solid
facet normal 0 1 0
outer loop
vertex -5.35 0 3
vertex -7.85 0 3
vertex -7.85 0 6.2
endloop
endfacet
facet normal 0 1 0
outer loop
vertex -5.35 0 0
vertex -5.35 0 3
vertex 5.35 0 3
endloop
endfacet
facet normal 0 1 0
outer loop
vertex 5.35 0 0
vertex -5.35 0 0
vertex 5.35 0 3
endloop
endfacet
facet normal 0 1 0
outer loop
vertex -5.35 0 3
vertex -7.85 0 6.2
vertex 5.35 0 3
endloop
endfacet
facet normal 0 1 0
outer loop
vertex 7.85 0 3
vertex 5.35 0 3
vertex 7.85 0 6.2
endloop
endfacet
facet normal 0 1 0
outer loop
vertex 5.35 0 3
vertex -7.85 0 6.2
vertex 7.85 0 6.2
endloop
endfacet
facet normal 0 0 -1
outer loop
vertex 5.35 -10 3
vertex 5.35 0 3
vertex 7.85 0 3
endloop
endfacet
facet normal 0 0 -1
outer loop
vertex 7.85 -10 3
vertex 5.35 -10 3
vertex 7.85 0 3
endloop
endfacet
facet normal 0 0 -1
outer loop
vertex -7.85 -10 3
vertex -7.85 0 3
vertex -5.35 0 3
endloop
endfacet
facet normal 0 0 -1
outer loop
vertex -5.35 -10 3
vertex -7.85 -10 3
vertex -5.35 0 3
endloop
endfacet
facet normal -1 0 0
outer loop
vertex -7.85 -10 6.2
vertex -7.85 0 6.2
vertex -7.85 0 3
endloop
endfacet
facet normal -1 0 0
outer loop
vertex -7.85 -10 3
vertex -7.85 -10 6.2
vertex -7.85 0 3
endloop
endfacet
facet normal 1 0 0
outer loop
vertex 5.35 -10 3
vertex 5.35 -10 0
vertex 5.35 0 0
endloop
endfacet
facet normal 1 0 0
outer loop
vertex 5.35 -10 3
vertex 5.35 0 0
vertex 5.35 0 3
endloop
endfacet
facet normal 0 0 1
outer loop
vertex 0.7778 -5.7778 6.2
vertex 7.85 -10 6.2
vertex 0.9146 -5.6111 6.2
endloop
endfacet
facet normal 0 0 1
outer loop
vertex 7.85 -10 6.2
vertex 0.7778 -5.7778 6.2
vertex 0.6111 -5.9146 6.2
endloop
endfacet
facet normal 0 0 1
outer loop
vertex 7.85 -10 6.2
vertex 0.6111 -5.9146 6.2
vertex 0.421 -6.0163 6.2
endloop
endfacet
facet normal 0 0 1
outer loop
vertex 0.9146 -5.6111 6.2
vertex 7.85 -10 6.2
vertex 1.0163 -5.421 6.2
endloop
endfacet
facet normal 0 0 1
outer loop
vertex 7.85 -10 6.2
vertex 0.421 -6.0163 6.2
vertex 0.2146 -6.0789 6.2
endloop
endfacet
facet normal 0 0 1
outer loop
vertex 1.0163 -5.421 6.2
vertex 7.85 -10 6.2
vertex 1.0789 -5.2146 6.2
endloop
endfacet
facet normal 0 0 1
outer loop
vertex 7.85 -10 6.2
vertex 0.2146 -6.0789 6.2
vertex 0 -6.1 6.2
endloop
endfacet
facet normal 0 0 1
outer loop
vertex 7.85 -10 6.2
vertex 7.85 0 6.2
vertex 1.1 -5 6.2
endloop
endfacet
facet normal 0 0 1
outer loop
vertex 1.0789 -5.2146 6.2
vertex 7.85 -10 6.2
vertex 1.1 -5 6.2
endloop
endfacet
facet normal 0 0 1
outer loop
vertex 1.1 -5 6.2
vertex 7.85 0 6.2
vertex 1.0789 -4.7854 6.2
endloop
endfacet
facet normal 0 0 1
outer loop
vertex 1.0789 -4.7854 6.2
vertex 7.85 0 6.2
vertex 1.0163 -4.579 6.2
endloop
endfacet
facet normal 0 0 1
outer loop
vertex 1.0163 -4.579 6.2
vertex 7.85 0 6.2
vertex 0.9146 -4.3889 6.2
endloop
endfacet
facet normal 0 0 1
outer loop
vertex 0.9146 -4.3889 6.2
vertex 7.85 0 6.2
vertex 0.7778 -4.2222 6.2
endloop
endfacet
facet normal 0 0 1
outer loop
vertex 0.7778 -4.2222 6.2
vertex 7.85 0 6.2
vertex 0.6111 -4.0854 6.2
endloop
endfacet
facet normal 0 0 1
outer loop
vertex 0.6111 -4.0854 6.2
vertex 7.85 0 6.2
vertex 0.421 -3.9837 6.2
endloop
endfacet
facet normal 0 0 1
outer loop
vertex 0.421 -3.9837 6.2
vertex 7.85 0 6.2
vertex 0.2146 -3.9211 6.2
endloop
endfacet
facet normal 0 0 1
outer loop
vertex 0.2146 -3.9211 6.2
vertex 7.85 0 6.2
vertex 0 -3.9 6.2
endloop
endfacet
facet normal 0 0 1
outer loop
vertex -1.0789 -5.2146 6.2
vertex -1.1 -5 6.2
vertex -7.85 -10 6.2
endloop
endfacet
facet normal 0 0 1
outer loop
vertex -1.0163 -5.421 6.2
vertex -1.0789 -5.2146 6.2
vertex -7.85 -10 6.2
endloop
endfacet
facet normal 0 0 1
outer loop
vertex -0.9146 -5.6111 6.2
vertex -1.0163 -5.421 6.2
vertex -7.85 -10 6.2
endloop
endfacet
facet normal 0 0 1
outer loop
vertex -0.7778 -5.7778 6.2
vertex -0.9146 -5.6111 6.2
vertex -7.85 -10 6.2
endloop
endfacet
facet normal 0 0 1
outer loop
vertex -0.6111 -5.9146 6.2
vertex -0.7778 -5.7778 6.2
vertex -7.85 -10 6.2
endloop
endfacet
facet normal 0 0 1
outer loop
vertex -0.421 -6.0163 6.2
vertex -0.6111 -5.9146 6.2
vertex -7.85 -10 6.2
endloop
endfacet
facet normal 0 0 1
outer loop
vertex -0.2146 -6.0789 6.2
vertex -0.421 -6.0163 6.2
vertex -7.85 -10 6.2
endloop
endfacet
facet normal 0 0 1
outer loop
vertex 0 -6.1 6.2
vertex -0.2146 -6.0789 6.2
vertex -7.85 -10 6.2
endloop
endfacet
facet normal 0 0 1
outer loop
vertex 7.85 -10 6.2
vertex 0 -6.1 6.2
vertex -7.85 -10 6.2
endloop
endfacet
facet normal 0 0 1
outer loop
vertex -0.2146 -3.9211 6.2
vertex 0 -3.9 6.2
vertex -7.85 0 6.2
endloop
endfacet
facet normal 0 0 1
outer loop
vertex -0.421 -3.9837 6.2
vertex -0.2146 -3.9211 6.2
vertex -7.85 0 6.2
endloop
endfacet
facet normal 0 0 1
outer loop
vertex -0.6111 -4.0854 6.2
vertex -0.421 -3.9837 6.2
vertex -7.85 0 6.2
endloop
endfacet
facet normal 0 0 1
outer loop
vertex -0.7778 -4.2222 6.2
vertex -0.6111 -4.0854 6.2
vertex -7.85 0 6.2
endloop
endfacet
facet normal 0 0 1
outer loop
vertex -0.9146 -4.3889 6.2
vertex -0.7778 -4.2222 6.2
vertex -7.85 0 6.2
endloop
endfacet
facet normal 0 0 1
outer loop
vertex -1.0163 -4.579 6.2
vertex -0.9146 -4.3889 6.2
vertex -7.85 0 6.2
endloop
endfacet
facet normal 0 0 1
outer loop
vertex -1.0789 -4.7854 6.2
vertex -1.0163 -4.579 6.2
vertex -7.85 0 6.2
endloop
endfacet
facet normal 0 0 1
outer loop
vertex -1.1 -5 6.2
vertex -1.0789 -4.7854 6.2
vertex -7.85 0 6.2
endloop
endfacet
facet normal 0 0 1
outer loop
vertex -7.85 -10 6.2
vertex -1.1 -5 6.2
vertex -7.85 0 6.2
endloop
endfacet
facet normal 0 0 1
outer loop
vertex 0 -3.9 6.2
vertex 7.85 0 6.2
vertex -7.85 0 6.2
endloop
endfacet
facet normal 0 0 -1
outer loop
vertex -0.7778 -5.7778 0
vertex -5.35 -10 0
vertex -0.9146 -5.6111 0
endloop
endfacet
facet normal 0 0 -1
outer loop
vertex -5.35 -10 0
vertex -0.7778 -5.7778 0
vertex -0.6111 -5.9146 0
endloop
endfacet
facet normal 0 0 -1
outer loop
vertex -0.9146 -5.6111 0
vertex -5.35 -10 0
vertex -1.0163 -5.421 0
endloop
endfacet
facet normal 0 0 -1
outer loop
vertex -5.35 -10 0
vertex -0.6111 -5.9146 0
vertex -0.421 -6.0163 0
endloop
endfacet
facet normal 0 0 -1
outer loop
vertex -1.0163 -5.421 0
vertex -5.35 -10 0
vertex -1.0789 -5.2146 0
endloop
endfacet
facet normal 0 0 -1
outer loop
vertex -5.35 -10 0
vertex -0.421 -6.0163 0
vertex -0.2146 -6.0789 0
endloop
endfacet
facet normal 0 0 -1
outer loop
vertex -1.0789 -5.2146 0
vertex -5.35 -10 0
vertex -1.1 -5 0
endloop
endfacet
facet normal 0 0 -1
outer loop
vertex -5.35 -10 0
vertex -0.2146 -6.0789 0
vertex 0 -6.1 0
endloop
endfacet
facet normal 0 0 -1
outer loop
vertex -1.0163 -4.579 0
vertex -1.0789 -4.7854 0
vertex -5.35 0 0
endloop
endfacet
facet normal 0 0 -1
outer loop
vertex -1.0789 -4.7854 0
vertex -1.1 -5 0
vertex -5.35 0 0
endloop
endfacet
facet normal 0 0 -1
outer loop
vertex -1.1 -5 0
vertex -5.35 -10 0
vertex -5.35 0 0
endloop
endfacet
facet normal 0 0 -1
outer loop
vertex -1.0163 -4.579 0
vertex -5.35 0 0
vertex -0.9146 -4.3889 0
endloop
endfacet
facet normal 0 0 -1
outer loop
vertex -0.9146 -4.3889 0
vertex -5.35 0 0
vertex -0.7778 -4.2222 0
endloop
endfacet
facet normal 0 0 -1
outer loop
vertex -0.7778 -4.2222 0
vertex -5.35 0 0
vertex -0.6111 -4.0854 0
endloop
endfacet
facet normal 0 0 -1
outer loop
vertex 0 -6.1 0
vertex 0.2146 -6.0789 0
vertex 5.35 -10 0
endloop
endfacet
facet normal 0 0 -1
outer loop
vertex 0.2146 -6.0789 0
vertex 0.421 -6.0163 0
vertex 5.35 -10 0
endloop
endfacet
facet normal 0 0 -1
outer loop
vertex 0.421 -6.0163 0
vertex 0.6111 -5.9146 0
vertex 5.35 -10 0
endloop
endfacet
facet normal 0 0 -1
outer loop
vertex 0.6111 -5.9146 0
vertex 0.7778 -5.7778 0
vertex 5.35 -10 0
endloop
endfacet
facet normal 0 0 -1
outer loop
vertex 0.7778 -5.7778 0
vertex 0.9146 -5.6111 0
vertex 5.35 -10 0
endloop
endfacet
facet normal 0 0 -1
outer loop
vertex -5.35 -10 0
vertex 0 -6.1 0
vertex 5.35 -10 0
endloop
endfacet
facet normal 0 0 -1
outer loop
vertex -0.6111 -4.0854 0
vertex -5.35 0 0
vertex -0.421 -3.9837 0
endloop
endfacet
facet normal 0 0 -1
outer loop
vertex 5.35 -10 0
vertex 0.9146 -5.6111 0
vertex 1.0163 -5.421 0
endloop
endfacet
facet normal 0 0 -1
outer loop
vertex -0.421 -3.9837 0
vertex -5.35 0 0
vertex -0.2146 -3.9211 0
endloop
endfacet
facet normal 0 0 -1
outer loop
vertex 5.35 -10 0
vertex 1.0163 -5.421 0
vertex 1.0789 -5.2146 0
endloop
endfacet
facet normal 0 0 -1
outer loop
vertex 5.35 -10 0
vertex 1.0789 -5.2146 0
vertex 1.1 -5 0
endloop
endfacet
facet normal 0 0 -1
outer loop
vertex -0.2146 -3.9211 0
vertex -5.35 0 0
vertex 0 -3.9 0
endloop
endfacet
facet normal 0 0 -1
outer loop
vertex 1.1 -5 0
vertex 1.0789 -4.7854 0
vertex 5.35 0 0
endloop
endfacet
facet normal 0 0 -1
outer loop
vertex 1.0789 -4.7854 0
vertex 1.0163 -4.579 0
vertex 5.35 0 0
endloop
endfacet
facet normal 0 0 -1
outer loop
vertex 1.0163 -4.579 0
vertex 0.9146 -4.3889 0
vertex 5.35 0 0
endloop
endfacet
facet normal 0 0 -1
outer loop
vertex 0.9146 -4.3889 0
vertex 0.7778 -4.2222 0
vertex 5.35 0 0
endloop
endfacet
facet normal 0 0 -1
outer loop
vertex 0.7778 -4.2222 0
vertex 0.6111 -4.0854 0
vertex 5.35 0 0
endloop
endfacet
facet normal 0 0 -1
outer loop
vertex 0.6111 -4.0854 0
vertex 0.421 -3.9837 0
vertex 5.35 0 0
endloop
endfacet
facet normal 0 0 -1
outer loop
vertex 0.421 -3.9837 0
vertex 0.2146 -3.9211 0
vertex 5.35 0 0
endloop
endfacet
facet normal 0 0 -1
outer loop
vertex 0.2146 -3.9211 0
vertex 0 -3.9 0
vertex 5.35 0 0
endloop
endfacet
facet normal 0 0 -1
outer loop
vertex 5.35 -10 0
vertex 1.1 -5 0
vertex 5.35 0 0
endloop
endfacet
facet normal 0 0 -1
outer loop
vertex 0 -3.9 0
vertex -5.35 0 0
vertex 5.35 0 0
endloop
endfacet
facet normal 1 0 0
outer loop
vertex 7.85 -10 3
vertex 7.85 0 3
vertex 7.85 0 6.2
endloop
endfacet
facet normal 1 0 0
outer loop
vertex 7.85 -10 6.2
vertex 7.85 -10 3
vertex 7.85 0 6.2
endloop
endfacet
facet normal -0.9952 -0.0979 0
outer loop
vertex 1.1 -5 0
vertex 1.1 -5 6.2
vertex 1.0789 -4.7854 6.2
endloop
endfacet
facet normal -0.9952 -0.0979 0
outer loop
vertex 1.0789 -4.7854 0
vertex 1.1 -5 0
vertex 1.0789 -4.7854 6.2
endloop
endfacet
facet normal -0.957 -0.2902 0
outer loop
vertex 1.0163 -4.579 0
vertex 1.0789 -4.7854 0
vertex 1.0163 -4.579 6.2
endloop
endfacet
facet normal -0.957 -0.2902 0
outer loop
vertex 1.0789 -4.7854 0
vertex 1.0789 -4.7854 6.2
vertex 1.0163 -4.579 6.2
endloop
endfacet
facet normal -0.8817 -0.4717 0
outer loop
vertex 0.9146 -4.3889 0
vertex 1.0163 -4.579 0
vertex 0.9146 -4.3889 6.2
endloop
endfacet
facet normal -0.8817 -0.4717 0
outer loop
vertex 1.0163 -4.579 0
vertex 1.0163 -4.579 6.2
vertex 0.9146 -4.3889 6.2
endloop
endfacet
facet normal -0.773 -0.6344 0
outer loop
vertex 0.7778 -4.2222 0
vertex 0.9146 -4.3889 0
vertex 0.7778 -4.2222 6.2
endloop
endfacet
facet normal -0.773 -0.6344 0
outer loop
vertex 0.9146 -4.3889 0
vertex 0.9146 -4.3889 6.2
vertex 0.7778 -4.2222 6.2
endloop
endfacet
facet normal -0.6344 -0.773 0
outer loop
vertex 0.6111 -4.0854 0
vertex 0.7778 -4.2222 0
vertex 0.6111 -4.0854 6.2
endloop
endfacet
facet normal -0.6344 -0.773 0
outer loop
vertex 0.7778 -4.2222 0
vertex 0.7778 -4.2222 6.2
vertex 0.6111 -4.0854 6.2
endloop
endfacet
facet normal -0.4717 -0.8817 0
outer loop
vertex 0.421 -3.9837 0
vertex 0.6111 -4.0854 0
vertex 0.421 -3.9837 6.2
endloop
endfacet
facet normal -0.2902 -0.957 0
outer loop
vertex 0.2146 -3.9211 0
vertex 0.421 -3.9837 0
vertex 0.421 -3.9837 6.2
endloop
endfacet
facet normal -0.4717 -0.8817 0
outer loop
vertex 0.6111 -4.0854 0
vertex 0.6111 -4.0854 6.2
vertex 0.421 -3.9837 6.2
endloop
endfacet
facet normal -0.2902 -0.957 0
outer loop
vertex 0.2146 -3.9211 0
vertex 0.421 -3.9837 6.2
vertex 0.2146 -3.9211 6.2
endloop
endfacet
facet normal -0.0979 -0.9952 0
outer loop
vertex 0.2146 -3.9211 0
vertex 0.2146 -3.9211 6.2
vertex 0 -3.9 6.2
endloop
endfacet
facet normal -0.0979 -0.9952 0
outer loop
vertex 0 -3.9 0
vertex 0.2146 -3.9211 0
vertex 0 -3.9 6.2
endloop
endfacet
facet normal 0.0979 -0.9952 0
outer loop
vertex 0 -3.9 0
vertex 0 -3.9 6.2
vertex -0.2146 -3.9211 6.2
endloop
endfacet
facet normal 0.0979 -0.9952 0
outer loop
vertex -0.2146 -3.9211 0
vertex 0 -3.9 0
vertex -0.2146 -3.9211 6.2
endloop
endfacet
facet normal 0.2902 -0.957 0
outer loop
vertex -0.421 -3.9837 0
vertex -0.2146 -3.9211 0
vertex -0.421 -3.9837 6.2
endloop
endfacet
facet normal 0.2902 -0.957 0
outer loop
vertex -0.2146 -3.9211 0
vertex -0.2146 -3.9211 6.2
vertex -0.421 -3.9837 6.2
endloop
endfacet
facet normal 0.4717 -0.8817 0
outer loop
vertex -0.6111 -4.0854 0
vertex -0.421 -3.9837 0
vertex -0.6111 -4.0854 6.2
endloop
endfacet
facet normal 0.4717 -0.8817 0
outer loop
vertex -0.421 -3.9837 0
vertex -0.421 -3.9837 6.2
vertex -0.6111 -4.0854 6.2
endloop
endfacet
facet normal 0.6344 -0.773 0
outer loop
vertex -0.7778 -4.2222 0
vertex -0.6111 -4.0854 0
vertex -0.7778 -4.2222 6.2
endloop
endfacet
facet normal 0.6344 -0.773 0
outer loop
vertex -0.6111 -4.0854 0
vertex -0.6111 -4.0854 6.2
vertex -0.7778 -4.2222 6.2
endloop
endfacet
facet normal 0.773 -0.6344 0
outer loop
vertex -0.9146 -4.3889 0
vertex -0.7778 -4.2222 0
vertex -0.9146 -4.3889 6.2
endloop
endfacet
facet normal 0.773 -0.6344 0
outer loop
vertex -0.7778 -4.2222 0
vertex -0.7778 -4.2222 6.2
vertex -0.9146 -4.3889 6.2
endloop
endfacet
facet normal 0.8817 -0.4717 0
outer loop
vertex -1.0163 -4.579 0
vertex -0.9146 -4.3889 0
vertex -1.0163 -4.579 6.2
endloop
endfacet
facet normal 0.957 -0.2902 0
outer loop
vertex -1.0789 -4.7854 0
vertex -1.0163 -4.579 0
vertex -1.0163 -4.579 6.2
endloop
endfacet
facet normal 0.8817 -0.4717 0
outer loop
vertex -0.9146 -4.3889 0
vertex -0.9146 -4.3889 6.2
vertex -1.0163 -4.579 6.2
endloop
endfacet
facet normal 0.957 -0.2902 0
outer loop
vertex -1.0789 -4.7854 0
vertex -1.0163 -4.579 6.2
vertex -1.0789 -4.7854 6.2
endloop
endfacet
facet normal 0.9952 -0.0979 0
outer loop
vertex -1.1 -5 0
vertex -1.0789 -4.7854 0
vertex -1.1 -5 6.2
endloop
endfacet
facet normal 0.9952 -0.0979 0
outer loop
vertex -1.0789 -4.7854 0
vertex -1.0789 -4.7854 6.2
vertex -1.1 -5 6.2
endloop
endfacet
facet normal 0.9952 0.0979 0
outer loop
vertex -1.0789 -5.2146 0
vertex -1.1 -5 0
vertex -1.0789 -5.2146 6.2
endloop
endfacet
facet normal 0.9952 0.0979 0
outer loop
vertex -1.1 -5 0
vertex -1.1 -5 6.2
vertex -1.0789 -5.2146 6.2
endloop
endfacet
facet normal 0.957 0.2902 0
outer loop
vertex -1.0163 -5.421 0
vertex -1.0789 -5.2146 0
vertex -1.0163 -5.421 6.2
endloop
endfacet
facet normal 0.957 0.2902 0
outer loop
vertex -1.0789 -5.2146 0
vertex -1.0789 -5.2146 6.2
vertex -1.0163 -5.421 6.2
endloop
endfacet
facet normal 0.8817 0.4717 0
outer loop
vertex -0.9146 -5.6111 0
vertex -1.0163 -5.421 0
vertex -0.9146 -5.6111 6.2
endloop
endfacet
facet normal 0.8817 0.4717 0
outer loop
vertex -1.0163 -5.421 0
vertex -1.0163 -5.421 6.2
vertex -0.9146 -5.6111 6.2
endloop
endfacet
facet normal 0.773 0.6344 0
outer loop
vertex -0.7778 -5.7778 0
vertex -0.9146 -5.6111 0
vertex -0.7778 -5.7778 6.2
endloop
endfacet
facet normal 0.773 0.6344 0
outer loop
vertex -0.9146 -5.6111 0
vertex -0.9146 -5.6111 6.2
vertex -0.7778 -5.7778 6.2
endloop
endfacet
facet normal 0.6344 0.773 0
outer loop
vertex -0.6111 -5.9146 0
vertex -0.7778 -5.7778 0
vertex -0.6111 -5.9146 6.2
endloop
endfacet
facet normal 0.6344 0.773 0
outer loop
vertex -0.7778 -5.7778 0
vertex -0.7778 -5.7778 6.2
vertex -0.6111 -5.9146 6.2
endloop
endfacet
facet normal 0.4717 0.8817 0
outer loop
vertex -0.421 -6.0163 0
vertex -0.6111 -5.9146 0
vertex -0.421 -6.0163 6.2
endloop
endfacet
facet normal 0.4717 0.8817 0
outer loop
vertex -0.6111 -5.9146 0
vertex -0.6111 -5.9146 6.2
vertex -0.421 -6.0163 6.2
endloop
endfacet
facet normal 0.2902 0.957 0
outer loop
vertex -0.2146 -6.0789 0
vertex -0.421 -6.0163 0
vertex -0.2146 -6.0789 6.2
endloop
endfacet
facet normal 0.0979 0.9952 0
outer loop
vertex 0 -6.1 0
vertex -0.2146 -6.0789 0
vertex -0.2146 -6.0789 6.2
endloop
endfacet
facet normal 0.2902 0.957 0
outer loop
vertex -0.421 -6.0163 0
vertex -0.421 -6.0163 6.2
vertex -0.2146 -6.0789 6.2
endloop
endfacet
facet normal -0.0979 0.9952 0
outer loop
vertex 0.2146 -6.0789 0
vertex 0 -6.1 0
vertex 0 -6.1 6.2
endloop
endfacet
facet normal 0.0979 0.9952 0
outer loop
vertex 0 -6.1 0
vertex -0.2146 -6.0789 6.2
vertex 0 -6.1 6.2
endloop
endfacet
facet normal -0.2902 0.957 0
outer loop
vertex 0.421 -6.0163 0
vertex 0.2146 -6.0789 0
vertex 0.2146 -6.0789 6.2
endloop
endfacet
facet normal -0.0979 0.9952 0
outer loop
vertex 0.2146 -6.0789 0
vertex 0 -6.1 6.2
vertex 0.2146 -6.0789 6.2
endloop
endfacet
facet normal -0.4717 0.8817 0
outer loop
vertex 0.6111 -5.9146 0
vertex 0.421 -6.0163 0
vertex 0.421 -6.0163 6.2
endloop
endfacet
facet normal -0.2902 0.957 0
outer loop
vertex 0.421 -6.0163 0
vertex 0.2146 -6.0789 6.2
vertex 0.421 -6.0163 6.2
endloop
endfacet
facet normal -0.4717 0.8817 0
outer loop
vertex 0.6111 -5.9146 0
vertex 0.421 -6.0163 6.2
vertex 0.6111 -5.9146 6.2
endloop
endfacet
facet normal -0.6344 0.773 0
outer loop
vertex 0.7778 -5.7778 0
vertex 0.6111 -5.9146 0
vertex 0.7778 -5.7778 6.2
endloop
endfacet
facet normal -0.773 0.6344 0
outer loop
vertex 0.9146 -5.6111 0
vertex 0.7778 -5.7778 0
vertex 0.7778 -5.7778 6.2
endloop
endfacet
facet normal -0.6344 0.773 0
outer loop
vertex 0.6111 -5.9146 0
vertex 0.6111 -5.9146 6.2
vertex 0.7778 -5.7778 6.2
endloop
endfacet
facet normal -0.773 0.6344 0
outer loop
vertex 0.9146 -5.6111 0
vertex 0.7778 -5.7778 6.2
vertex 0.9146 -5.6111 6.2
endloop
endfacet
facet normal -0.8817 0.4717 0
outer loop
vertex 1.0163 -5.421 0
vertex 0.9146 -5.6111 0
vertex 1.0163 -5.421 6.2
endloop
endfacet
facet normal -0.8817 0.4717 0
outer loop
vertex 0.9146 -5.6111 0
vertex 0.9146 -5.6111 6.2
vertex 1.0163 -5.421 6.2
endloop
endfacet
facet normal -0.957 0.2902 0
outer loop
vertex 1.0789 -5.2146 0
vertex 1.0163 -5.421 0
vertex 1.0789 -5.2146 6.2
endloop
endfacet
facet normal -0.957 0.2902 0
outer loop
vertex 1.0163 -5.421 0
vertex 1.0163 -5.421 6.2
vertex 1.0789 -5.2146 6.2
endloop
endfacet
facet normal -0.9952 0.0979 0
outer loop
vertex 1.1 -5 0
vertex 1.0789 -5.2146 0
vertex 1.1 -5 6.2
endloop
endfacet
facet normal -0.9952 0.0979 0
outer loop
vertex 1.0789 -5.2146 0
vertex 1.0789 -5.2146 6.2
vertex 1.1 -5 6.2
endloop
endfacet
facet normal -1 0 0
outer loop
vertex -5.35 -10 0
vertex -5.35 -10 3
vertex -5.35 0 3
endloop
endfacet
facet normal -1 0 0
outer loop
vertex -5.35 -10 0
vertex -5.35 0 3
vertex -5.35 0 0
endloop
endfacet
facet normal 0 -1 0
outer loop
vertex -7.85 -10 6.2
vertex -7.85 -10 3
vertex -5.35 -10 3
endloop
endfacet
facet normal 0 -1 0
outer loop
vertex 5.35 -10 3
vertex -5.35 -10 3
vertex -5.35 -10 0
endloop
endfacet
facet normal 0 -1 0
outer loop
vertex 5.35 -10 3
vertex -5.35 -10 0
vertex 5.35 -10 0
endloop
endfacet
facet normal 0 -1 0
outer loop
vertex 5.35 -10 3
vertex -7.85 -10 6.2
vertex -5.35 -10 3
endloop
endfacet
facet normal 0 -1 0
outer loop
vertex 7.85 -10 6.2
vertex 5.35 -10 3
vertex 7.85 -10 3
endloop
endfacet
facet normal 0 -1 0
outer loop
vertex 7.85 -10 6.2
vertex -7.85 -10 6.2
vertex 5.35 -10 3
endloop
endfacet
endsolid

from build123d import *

# Parameters (mm, degrees)
F1_DEPTH = 10
F2_R     = 1.1
F3_DEPTH = 6.2


with BuildPart() as f1:
    # F0 (on Front) → F1 (new body)
    with BuildSketch(Plane.XZ):
        Polygon((-5.35, 3), (-5.35, 0), (5.35, 0), (5.35, 3), (7.85, 3), (7.85, 6.2), (-7.85, 6.2), (-7.85, 3), align=None)
    extrude(amount=F1_DEPTH)

    # F2 (on face) → F3 (cut, through all)
    with BuildSketch(Plane.XY.offset(6.2)):
        with Locations((0, -5)):
            Circle(F2_R)
    extrude(amount=-F3_DEPTH, mode=Mode.SUBTRACT)


solid = f1.part
